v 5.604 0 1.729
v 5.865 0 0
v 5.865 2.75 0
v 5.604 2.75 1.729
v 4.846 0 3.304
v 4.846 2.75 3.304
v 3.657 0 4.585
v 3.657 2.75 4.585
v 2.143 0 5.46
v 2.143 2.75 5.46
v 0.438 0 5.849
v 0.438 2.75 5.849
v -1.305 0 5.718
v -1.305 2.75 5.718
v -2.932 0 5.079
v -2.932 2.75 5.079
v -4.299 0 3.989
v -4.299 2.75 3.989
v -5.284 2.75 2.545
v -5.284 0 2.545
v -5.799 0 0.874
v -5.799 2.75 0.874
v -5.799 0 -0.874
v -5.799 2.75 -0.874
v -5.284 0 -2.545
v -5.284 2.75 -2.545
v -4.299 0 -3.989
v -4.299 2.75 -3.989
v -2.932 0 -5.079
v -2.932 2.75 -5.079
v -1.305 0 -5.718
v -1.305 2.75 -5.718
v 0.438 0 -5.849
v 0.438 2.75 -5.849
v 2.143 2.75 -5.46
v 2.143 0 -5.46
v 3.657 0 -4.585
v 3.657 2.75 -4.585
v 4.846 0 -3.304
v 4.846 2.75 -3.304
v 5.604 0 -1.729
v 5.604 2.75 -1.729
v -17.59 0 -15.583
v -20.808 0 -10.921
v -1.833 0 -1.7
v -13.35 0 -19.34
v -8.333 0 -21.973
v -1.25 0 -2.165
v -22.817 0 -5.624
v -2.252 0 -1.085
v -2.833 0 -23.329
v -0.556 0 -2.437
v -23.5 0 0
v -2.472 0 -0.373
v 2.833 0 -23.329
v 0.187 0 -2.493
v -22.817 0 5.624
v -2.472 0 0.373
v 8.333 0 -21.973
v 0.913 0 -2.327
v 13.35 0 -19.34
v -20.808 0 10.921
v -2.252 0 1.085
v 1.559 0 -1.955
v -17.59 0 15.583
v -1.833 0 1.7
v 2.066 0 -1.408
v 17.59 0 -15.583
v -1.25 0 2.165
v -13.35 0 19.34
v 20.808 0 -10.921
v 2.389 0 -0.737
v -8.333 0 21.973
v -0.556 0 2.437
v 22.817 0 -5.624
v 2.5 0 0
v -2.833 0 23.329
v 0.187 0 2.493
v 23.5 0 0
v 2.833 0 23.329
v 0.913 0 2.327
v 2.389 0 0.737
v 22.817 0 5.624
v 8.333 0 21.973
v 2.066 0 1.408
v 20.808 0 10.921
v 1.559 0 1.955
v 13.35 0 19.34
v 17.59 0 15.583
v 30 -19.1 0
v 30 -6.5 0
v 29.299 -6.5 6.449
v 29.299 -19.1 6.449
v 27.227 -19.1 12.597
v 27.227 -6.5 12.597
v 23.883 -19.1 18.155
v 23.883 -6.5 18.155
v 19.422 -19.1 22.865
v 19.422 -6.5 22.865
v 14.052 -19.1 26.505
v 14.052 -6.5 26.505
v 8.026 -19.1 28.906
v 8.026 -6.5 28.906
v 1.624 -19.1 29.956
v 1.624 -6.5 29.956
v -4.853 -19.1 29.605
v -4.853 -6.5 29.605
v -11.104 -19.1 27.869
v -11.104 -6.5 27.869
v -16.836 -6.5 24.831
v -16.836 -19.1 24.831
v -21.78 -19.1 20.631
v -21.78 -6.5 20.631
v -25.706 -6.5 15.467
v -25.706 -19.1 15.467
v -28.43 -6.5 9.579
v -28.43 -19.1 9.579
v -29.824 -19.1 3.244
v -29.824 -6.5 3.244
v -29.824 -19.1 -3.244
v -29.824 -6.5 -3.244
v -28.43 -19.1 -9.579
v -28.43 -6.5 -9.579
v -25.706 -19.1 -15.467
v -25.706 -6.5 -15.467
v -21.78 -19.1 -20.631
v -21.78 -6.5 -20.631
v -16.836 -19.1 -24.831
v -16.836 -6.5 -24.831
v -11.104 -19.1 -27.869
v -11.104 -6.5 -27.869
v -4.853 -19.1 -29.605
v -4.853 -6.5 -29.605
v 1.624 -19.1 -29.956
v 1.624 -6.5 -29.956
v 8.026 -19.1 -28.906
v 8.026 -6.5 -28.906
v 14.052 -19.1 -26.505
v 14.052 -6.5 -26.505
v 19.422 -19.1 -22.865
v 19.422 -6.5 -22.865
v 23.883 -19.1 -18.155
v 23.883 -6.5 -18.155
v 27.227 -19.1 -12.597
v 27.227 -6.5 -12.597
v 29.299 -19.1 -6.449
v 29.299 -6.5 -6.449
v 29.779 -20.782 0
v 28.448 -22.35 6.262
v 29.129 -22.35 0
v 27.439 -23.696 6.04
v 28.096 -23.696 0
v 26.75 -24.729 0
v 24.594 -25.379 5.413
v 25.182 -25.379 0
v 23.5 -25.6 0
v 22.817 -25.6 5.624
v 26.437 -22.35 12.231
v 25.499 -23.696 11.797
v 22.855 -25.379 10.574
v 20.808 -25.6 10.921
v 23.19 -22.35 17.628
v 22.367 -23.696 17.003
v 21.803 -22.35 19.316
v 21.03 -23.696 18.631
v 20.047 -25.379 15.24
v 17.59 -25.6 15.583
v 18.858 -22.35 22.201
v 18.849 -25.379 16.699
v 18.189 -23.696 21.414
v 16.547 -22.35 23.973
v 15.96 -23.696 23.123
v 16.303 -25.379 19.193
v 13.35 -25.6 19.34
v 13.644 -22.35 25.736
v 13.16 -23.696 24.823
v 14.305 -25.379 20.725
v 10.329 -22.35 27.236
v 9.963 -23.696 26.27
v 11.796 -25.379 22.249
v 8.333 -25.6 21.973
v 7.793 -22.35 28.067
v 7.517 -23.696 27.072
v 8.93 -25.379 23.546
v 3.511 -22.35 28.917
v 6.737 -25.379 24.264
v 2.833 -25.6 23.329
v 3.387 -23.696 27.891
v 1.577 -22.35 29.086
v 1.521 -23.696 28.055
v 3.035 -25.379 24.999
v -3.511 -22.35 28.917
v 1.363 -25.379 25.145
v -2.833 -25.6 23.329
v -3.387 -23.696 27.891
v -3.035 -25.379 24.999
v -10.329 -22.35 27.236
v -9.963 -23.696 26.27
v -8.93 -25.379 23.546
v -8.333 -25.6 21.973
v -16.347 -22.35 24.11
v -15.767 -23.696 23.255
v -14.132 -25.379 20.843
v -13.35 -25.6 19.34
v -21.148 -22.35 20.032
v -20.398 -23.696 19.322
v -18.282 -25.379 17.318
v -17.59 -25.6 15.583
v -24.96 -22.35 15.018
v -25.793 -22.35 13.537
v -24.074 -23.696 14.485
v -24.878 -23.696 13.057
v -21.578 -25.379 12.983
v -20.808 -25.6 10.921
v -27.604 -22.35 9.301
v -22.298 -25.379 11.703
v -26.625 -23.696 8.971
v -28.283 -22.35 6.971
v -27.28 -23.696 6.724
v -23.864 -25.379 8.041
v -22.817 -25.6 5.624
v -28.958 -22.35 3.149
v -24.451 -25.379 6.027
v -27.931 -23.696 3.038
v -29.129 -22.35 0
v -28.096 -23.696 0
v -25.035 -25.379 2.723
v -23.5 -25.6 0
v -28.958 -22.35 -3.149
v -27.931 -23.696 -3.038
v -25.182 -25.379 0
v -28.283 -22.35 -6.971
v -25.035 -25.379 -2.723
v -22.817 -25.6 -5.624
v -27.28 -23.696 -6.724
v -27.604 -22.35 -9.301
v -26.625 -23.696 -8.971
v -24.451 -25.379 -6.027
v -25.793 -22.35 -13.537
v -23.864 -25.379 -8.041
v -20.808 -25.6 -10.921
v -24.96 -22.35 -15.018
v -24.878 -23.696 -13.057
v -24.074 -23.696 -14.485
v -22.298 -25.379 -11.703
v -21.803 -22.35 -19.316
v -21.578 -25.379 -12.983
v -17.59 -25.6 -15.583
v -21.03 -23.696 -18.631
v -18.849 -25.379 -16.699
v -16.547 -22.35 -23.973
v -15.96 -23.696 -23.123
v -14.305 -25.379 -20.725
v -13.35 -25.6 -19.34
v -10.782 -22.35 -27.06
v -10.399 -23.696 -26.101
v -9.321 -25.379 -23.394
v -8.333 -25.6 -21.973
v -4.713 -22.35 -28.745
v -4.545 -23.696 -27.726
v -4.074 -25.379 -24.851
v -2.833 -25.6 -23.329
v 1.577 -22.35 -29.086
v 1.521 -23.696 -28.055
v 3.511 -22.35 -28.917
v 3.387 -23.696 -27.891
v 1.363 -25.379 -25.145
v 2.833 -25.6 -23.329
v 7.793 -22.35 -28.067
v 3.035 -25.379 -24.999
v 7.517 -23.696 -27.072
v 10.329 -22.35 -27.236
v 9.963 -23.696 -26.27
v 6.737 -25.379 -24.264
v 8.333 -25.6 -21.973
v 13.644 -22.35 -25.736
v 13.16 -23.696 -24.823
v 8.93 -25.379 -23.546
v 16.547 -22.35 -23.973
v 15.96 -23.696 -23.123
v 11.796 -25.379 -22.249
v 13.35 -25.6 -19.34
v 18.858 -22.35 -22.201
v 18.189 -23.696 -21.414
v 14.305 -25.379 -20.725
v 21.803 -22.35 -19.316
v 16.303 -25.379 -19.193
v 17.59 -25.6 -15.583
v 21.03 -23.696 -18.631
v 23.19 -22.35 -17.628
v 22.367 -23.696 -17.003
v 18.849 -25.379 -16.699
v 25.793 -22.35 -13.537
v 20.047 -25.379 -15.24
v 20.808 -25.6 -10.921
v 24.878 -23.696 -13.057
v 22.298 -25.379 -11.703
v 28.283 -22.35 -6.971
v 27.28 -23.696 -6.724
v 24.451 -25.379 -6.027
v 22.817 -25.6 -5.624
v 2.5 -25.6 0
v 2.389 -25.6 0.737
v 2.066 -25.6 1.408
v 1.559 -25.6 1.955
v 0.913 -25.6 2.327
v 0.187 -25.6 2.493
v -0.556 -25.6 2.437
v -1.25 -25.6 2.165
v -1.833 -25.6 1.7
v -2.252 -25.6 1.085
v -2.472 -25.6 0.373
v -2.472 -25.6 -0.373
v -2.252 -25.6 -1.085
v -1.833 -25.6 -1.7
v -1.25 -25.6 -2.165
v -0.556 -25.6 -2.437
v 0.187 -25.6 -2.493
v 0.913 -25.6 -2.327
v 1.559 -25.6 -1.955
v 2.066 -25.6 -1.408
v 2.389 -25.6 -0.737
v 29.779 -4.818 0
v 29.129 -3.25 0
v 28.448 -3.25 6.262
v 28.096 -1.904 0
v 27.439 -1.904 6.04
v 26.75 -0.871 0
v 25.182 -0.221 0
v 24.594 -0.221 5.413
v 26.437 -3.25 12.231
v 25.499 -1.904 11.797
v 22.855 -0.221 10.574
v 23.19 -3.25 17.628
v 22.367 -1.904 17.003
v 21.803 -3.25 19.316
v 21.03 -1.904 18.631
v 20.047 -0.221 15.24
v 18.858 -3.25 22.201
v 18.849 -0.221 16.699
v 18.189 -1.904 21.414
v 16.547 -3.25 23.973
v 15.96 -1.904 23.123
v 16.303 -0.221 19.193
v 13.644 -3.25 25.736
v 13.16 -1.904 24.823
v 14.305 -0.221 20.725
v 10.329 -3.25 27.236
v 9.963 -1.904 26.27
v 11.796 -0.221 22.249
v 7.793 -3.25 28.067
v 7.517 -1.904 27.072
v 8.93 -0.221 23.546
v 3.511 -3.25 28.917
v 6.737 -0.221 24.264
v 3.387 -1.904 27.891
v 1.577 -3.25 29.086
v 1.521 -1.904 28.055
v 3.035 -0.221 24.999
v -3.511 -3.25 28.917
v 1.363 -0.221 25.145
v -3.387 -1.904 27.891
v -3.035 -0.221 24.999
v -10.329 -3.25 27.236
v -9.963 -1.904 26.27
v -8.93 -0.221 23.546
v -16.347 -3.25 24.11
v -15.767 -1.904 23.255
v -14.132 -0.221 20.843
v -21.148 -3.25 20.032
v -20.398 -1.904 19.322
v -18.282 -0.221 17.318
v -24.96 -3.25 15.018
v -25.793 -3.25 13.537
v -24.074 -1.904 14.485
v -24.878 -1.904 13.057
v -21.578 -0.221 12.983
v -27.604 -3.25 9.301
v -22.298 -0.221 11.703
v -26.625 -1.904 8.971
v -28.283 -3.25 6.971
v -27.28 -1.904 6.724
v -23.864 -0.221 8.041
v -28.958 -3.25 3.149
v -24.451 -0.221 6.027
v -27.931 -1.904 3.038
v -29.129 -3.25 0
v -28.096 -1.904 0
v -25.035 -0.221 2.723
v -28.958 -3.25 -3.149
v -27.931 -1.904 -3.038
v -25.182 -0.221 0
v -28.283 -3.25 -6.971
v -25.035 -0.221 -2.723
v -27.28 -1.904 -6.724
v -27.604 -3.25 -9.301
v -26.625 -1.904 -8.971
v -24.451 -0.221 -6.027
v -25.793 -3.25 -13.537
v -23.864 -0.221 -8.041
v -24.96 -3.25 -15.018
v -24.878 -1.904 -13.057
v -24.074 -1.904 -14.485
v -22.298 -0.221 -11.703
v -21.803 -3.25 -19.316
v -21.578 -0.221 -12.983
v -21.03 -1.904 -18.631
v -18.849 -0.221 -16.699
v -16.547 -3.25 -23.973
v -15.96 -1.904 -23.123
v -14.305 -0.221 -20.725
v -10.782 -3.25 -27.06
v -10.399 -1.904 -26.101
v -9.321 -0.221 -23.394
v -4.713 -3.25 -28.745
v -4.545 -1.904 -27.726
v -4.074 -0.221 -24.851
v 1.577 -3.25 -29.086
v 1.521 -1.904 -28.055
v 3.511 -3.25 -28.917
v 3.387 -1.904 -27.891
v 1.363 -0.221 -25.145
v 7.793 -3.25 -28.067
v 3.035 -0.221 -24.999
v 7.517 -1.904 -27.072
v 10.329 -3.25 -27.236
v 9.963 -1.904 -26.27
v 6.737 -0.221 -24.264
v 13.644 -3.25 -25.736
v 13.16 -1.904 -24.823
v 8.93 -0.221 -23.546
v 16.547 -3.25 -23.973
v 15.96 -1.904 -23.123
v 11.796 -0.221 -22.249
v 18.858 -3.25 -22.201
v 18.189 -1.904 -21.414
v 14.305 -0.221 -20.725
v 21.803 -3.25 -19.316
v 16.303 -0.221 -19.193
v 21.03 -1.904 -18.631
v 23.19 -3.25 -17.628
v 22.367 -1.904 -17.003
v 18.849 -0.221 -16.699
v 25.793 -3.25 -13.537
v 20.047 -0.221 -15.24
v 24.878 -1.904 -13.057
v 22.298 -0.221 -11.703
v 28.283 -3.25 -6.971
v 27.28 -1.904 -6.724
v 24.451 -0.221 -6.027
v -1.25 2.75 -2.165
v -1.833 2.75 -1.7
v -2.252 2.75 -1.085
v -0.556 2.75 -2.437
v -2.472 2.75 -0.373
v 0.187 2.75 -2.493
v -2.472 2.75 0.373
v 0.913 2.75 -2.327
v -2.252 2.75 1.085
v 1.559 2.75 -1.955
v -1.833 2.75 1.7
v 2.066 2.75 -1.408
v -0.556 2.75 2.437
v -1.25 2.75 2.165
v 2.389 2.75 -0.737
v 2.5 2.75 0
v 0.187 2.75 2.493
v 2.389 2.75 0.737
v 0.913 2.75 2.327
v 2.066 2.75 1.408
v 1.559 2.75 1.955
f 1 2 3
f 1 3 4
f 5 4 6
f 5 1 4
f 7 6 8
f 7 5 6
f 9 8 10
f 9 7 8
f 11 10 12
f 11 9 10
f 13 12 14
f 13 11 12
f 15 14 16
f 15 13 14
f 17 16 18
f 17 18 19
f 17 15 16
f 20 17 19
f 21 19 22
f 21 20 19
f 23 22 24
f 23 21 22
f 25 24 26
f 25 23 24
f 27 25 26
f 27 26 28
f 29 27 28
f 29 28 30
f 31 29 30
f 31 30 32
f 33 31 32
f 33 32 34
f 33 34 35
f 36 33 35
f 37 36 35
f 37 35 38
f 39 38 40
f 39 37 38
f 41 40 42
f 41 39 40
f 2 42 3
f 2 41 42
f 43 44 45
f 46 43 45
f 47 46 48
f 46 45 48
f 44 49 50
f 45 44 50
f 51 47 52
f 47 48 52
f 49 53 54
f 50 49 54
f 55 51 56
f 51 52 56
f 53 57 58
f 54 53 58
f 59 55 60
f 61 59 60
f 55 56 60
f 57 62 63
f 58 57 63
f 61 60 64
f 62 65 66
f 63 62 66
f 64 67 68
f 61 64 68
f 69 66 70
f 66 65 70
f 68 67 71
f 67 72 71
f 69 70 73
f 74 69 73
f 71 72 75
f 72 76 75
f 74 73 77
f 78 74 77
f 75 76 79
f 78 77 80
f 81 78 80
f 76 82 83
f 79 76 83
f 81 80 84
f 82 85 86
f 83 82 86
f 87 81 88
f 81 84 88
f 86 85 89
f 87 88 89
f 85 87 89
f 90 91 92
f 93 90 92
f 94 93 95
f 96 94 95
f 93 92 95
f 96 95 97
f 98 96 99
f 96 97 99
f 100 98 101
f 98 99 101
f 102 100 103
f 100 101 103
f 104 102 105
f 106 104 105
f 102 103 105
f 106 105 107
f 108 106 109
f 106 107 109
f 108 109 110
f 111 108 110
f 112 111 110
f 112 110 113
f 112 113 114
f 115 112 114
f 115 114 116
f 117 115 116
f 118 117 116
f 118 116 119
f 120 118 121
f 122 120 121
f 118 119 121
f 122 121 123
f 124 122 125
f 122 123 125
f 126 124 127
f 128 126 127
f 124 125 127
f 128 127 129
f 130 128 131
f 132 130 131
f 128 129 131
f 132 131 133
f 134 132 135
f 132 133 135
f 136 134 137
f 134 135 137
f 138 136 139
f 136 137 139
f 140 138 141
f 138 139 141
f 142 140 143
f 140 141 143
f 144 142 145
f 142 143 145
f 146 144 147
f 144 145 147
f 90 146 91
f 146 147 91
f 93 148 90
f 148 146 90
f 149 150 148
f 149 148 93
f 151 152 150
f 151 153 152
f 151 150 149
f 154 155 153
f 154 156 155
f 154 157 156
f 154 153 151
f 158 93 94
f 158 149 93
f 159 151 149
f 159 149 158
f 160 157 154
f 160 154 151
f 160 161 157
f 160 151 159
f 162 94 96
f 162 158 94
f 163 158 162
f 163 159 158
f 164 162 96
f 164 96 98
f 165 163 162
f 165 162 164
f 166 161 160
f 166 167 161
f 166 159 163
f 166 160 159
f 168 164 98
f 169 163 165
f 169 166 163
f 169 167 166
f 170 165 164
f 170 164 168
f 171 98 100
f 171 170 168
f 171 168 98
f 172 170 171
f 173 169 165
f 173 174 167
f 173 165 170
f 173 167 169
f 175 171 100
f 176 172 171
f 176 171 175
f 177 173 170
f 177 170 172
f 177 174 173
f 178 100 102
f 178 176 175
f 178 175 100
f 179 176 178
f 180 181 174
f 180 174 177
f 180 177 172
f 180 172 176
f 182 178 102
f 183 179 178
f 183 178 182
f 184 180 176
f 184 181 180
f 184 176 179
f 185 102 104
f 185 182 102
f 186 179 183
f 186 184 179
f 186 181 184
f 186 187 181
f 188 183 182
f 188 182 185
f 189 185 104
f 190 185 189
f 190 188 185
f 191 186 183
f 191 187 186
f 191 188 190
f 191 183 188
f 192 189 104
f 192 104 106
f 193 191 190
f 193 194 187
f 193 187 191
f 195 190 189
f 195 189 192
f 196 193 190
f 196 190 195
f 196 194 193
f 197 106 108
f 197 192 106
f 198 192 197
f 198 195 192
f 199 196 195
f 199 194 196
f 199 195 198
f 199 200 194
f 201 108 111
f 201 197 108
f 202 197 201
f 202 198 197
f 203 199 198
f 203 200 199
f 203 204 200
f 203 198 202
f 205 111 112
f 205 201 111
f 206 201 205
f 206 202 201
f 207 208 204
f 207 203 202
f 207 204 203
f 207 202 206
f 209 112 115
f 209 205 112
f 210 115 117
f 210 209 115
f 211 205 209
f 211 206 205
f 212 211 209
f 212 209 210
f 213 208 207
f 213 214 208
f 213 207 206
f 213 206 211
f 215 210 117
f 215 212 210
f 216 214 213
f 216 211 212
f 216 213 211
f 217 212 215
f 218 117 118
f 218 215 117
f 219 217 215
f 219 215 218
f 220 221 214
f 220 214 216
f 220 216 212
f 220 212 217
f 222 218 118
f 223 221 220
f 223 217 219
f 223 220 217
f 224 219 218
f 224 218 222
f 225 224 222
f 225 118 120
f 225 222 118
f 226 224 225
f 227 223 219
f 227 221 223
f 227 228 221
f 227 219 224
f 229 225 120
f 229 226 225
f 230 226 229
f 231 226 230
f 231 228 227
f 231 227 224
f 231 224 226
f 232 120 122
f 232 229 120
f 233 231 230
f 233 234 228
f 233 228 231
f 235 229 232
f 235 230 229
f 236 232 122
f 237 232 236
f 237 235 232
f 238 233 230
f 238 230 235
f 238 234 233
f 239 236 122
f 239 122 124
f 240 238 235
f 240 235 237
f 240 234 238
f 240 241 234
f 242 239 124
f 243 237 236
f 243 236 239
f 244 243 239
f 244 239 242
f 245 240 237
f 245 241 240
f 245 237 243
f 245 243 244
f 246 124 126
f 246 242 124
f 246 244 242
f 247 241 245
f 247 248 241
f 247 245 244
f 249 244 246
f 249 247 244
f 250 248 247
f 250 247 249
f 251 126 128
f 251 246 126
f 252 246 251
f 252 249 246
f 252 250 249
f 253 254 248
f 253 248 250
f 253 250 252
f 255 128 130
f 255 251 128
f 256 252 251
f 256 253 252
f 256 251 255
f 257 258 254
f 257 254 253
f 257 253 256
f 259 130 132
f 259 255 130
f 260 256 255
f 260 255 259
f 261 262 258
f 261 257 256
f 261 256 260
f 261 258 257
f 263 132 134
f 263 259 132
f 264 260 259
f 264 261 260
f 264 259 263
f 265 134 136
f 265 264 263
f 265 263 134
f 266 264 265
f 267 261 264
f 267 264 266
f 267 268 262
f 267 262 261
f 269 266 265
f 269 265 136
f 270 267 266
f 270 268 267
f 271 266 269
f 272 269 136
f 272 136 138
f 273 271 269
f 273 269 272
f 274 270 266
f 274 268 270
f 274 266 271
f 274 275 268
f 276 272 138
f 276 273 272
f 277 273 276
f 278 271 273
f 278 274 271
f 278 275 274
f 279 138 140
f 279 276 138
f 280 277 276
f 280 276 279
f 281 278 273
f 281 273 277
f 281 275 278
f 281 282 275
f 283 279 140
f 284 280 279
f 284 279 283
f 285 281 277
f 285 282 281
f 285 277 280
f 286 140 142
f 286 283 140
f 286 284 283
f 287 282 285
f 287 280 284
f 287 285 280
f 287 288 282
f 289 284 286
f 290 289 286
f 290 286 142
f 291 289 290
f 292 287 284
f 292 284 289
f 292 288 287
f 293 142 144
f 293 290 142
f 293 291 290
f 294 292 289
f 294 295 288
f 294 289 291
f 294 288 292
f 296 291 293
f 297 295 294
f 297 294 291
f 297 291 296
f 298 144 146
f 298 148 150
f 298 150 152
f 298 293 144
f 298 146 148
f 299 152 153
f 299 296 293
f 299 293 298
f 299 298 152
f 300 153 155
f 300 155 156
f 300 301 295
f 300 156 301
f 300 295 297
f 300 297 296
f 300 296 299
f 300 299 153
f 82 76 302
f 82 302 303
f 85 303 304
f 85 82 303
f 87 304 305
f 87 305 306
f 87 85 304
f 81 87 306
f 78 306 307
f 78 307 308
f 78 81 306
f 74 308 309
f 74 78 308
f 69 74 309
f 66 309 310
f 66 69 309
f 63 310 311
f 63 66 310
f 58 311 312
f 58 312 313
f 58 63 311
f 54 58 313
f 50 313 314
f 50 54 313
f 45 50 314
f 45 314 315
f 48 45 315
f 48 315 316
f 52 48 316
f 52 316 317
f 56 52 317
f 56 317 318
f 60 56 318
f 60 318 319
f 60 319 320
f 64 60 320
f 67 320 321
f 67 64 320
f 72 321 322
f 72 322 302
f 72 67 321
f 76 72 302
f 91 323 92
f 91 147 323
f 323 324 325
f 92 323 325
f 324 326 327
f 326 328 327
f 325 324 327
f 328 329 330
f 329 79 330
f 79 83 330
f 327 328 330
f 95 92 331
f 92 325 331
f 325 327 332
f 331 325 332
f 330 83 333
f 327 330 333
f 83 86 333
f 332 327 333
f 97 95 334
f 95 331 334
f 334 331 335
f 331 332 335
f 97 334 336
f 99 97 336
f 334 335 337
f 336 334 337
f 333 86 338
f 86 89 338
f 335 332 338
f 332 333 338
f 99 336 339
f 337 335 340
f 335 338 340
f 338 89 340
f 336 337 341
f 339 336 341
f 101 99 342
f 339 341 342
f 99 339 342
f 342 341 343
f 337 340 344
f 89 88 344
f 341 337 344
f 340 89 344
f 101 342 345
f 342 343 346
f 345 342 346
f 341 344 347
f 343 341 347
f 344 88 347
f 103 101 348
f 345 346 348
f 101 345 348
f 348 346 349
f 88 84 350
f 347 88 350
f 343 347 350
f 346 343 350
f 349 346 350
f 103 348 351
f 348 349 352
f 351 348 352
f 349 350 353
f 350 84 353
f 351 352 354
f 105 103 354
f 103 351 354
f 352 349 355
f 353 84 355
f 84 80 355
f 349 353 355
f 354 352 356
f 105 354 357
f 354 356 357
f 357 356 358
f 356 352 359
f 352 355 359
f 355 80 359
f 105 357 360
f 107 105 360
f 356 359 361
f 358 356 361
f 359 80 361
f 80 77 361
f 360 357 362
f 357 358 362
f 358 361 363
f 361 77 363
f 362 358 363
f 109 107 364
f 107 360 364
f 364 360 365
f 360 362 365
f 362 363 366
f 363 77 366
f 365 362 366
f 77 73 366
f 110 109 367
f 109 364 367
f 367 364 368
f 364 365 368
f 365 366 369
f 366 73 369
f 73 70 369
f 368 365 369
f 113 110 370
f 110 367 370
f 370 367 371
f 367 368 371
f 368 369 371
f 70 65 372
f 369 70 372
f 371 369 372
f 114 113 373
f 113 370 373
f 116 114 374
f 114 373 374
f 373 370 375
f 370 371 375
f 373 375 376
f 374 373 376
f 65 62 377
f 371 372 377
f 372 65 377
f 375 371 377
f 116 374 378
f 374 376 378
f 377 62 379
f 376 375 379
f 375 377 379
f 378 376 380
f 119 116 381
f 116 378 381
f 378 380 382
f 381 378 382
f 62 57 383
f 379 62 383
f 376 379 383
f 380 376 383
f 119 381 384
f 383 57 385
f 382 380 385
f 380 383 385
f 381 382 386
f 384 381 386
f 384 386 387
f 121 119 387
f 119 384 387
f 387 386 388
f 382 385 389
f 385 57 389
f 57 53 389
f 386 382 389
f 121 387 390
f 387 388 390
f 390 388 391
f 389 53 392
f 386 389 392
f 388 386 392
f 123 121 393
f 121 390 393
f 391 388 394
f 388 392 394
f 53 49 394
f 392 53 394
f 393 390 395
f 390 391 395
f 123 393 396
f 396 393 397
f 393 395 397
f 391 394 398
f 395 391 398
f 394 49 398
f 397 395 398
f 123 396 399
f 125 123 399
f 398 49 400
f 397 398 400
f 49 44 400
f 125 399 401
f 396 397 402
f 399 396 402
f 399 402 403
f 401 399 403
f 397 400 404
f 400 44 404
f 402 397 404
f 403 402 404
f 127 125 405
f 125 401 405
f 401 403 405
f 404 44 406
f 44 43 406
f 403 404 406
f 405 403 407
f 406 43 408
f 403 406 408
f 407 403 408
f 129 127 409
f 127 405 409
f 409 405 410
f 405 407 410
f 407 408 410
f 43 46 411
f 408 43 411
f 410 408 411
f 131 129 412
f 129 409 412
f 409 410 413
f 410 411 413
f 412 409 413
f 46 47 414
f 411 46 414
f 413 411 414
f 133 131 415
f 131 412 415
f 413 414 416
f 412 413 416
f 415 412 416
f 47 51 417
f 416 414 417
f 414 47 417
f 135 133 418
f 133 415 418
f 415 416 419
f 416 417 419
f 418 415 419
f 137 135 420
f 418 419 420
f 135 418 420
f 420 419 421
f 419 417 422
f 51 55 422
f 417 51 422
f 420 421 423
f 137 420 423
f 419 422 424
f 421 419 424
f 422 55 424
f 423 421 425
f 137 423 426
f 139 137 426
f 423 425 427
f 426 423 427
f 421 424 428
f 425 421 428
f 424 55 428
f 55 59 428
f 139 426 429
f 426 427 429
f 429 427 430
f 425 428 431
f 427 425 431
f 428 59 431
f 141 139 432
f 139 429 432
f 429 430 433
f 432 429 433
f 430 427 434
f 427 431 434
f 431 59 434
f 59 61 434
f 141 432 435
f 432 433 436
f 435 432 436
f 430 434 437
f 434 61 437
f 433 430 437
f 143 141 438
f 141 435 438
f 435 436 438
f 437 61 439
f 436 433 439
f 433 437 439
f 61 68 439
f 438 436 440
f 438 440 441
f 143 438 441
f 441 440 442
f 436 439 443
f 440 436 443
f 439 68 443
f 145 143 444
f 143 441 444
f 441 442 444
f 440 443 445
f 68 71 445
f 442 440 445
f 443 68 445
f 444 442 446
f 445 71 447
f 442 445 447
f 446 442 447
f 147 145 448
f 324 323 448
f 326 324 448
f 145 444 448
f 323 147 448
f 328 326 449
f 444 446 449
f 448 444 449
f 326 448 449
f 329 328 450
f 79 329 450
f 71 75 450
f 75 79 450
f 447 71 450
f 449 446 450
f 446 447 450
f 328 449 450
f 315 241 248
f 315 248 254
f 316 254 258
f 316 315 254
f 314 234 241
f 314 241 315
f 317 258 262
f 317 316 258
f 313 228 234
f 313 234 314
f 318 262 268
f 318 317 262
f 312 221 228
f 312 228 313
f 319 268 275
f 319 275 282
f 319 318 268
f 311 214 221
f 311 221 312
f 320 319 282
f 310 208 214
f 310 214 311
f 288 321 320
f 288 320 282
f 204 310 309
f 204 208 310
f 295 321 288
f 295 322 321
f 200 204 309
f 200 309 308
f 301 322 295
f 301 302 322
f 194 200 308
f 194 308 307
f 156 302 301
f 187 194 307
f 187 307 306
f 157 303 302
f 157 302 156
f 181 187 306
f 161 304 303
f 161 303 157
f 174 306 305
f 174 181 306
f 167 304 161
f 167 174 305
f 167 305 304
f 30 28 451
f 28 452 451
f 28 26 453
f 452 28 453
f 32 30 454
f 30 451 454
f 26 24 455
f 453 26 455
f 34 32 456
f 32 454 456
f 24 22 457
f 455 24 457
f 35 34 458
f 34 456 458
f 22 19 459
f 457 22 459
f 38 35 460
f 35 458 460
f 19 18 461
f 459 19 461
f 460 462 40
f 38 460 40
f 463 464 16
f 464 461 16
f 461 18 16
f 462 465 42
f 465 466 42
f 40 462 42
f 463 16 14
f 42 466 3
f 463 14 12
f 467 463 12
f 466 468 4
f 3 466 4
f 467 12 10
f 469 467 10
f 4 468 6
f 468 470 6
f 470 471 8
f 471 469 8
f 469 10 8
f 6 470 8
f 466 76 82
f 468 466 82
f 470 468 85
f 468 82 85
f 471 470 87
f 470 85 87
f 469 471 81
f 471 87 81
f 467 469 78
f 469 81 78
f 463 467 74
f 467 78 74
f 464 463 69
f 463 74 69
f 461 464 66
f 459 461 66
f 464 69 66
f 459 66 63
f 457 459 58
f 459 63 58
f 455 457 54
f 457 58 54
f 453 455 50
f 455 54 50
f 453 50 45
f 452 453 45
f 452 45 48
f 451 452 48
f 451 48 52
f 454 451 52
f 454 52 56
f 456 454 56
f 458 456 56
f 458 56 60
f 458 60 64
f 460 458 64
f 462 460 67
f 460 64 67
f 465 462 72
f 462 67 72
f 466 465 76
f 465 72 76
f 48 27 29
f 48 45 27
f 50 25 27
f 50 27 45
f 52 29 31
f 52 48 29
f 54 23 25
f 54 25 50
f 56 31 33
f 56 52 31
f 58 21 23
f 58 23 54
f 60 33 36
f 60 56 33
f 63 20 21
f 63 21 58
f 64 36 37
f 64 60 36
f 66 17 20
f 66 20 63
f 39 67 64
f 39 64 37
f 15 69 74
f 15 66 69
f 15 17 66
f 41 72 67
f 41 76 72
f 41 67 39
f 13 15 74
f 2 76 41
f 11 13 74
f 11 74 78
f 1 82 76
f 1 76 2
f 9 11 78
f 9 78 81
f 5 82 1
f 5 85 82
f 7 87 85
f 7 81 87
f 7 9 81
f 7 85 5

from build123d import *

# Parameters (mm, degrees)
F0_R     = 30
F0_R_2   = 5.864988
F0_R_3   = 2.5
F1_DEPTH = 25.6
F2_R     = 6.5
F3_DEPTH = 2.75


with BuildPart() as f1:
    # F0 (on Front) → F1 (new body)
    with BuildSketch(Plane.XZ):
        Circle(F0_R)
        Circle(F0_R_2, mode=Mode.SUBTRACT)
        Circle(F0_R_2)
        Circle(F0_R_3, mode=Mode.SUBTRACT)
    extrude(amount=F1_DEPTH)

    # F2
    f2_edges = [f1.edges().sort_by_distance(p)[0] for p in [
        (-30, -25.6, 0),
        (-30, 0, 0),
    ]]
    fillet(f2_edges, radius=F2_R)


with BuildPart() as f3:
    # F0 (on Front) → F3 (new body)
    with BuildSketch(Plane.XZ):
        Circle(F0_R_2)
        Circle(F0_R_3, mode=Mode.SUBTRACT)
    extrude(amount=-F3_DEPTH)


solid = Compound([f1.part, f3.part])
